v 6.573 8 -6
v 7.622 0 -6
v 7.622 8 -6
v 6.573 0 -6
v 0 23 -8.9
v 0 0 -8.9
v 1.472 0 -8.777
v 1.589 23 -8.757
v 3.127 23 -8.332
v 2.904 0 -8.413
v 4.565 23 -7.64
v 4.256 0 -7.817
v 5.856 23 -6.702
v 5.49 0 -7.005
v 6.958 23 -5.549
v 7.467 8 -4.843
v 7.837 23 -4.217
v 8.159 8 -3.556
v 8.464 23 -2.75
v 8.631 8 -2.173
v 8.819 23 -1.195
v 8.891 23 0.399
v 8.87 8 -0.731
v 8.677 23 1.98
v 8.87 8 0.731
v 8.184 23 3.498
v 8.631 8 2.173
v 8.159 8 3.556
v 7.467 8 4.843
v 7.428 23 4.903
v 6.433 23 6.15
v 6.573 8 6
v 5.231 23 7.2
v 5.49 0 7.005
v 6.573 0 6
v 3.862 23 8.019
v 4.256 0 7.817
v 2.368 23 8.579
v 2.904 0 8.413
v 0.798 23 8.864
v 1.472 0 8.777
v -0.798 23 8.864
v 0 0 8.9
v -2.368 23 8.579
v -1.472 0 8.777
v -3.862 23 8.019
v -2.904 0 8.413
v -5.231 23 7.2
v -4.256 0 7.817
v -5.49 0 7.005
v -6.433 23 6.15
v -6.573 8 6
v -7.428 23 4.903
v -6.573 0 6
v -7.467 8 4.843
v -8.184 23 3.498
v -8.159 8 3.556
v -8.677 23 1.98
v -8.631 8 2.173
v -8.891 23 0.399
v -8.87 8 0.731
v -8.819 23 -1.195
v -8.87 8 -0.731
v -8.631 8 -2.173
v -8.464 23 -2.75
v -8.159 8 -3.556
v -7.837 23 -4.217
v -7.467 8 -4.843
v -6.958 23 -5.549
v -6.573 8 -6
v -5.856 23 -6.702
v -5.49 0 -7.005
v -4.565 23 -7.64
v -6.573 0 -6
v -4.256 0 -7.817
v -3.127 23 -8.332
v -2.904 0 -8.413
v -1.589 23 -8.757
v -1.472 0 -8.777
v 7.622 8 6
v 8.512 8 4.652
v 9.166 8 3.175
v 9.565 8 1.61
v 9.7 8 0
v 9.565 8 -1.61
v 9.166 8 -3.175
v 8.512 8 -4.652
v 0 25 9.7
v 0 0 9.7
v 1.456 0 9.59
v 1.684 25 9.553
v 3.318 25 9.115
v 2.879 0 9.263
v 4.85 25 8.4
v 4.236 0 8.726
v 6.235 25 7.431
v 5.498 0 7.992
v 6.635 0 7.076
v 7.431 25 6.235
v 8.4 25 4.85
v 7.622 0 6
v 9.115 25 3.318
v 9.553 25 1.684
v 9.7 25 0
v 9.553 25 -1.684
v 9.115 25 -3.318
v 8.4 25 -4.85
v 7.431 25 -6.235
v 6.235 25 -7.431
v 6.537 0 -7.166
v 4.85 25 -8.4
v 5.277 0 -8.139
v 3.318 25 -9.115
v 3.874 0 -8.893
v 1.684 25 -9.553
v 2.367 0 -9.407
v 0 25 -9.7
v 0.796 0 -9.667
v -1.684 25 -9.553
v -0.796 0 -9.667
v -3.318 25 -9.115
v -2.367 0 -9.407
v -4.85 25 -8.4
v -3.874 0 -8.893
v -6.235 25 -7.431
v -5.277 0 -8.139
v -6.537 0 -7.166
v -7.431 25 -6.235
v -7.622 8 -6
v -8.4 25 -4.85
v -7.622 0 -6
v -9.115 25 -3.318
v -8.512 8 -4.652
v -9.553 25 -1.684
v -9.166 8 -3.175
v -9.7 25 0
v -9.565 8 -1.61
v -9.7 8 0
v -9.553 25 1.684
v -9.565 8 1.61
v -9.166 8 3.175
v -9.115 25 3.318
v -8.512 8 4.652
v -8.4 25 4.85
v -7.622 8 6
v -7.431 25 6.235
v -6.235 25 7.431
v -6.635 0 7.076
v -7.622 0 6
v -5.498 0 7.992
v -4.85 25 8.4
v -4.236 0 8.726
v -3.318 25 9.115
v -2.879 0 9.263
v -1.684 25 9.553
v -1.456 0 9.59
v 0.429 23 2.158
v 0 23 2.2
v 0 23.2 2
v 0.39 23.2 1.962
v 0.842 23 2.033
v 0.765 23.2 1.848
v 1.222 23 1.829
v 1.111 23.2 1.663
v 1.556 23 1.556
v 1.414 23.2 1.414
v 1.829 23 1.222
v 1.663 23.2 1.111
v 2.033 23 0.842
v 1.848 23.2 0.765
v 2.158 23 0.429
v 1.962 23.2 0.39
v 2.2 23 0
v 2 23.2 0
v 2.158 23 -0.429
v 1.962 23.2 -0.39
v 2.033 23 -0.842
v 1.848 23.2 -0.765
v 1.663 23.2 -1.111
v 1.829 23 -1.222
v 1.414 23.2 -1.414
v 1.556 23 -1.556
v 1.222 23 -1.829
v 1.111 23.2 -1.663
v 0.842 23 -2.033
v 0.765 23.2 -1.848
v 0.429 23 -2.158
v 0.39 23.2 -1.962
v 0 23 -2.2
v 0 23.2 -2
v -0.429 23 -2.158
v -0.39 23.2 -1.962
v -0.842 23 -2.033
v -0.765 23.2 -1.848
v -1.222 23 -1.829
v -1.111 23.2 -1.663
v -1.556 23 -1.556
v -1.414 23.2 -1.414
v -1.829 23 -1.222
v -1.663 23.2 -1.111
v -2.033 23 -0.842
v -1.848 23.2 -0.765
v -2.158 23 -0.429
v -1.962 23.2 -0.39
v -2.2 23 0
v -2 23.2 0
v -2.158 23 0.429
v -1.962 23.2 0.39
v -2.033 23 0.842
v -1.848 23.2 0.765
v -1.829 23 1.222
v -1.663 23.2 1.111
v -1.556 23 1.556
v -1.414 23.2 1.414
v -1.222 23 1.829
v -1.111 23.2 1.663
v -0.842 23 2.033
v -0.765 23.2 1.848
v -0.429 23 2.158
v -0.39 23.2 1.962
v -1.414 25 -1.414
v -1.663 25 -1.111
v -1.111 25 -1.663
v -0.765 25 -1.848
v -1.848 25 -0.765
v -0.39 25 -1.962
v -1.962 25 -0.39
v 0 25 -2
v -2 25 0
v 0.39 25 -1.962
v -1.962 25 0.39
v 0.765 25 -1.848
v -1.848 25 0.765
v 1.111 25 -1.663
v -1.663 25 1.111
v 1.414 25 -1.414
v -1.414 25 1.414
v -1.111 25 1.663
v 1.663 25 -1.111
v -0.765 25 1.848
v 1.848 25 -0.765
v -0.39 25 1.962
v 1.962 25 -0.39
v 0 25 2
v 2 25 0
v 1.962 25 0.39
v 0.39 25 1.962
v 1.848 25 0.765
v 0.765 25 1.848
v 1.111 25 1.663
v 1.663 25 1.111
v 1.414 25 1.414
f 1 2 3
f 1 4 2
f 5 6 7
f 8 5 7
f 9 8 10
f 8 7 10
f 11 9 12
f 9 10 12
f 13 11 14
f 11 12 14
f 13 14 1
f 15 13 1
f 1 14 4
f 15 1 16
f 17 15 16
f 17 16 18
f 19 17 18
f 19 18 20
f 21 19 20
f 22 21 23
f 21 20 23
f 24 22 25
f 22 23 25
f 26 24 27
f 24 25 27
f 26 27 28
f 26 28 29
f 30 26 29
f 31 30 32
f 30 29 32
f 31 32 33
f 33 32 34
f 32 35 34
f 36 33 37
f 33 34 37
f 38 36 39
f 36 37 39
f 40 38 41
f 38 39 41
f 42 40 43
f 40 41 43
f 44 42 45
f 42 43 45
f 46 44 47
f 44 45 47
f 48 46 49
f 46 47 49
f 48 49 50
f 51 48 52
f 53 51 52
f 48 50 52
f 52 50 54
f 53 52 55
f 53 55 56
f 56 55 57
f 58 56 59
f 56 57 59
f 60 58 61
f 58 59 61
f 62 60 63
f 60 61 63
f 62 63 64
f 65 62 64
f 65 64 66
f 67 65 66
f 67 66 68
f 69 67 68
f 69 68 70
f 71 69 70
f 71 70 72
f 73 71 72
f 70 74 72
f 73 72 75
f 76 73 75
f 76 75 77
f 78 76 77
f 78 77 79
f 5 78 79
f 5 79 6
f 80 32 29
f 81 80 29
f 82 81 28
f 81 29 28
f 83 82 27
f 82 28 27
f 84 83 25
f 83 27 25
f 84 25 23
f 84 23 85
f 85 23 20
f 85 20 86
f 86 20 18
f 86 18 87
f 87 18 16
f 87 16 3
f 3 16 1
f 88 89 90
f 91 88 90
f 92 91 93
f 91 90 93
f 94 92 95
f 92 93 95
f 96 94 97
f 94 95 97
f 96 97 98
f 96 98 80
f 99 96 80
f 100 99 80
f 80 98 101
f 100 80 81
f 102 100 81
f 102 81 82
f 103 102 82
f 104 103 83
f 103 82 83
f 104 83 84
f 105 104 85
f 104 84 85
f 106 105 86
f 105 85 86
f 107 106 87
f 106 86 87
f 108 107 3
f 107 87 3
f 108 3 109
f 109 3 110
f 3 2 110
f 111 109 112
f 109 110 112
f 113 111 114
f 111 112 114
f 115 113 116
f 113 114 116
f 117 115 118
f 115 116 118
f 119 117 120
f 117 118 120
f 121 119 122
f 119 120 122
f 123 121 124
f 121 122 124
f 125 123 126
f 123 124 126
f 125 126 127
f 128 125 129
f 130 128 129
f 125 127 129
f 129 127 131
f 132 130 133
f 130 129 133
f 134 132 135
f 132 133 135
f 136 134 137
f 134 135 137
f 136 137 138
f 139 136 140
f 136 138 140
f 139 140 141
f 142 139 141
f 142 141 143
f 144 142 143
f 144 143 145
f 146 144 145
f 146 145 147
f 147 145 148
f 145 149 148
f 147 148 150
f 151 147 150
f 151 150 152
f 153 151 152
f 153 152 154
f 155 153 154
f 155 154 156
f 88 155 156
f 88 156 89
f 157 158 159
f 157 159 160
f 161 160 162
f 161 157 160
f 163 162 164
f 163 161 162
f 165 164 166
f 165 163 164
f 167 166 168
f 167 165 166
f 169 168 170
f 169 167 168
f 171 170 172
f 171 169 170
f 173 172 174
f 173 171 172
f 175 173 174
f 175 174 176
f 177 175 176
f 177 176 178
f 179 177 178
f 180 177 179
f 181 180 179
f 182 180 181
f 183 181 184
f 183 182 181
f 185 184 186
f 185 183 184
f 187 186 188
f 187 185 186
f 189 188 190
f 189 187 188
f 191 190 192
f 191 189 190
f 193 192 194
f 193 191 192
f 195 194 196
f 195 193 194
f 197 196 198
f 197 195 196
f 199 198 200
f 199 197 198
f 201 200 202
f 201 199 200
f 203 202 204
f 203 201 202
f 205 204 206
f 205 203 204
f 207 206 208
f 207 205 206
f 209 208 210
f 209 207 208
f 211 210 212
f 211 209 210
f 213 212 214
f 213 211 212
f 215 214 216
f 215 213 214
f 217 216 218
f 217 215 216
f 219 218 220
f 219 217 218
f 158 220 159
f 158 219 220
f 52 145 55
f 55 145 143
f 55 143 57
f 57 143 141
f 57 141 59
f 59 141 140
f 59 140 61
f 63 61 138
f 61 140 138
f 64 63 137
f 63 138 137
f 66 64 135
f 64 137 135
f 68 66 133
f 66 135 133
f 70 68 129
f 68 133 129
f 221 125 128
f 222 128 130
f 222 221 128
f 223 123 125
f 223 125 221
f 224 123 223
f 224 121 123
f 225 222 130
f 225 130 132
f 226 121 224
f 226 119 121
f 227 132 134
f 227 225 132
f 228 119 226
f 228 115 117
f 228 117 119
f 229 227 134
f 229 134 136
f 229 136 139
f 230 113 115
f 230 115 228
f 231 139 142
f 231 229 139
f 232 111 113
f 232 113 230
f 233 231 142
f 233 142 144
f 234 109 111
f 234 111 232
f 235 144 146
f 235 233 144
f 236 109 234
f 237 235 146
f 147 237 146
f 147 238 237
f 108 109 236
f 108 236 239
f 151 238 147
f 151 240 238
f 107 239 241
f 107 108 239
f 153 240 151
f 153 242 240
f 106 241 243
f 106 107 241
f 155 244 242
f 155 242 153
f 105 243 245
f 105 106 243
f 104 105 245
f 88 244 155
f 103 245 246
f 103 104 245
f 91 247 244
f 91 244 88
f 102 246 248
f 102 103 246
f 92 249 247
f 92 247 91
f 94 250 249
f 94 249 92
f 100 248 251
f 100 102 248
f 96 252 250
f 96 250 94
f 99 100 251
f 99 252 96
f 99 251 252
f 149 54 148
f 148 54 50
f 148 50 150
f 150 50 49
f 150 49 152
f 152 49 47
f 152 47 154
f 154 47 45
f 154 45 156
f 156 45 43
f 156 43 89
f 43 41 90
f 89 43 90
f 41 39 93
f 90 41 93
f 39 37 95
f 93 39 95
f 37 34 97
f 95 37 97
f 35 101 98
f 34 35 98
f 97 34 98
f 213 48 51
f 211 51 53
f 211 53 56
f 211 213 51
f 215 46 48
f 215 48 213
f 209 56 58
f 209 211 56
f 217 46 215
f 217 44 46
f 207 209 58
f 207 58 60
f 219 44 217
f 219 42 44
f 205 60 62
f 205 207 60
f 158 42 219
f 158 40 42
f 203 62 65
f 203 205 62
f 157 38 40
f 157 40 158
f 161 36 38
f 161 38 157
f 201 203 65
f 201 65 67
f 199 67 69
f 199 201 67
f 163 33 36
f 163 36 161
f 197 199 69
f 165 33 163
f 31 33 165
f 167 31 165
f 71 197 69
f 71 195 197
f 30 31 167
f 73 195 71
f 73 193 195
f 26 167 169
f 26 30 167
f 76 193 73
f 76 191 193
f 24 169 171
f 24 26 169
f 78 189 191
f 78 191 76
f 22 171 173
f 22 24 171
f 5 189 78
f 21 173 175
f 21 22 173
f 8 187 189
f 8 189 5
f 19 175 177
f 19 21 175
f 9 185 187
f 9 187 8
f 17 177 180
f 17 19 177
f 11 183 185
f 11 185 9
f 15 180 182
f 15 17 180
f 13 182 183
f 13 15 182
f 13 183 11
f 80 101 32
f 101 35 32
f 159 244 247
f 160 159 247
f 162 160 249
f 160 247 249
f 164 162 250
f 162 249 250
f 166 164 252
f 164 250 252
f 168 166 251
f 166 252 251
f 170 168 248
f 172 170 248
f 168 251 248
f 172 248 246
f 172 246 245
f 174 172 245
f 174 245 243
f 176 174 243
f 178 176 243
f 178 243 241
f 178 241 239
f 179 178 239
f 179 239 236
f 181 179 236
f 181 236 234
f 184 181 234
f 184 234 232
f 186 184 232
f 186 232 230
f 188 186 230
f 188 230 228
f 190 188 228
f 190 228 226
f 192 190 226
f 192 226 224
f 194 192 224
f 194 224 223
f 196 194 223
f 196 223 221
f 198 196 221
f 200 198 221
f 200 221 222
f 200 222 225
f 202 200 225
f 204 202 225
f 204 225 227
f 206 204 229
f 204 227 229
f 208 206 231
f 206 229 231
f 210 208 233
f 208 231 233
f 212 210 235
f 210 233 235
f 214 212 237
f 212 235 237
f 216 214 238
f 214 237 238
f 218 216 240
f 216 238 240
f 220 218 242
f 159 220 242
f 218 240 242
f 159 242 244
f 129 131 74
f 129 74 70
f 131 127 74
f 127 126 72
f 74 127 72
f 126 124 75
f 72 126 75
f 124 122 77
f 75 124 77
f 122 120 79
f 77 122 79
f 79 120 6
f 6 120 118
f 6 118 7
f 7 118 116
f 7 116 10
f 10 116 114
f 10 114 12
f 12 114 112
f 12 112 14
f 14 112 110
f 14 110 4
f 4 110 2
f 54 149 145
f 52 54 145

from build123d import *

# Parameters (mm, degrees)
SKETCH_1_R               = 9.7
EXTRUDE_1_DEPTH          = 25
SKETCH_5_R               = 8.9
CUT_EXTRUDE_2_DEPTH      = 23
CUT_EXTRUDE_3_DEPTH      = 29.516311122
CUT_EXTRUDE_3_DEPTH_BACK = 29.516311122
SKETCH_6_W               = 12
SKETCH_6_H               = 16
SKETCH_9_R               = 2
CUT_EXTRUDE_4_DEPTH      = 29.516311122
CHAMFER_5_SIZE           = 0.2


with BuildPart() as part:
    # 草图1 → 凸台-拉伸1 (new body)
    with BuildSketch(Plane(origin=(0, 0, 0), x_dir=(1, 0, 0), z_dir=(0, 1, 0))):
        Circle(SKETCH_1_R)
    extrude(amount=EXTRUDE_1_DEPTH)

    # 草图5 → 切除-拉伸2 (cut)
    with BuildSketch(Plane.XZ):
        Circle(SKETCH_5_R)
    extrude(amount=-CUT_EXTRUDE_2_DEPTH, mode=Mode.SUBTRACT)

    # 草图6 → 切除-拉伸3 (cut, two sides: drawn at the far end of the back side and taken through both)
    with BuildSketch(Plane(origin=(0, 0, 0), x_dir=(0, 0, -1), z_dir=(1, 0, 0)).offset(-CUT_EXTRUDE_3_DEPTH_BACK)):
        Rectangle(SKETCH_6_W, SKETCH_6_H)
    extrude(amount=CUT_EXTRUDE_3_DEPTH + CUT_EXTRUDE_3_DEPTH_BACK, mode=Mode.SUBTRACT)

    # 草图9 → 切除-拉伸4 (cut, through all)
    with BuildSketch(Plane(origin=(0, 25, 0), x_dir=(1, 0, 0), z_dir=(0, 1, 0))):
        Circle(SKETCH_9_R)
    extrude(amount=-CUT_EXTRUDE_4_DEPTH, mode=Mode.SUBTRACT)

    # 倒角5
    chamfer_5_edges = [part.edges().sort_by_distance(p)[0] for p in [
        (-2, 23, 0),
    ]]
    chamfer(chamfer_5_edges, length=CHAMFER_5_SIZE)


solid = part.part
